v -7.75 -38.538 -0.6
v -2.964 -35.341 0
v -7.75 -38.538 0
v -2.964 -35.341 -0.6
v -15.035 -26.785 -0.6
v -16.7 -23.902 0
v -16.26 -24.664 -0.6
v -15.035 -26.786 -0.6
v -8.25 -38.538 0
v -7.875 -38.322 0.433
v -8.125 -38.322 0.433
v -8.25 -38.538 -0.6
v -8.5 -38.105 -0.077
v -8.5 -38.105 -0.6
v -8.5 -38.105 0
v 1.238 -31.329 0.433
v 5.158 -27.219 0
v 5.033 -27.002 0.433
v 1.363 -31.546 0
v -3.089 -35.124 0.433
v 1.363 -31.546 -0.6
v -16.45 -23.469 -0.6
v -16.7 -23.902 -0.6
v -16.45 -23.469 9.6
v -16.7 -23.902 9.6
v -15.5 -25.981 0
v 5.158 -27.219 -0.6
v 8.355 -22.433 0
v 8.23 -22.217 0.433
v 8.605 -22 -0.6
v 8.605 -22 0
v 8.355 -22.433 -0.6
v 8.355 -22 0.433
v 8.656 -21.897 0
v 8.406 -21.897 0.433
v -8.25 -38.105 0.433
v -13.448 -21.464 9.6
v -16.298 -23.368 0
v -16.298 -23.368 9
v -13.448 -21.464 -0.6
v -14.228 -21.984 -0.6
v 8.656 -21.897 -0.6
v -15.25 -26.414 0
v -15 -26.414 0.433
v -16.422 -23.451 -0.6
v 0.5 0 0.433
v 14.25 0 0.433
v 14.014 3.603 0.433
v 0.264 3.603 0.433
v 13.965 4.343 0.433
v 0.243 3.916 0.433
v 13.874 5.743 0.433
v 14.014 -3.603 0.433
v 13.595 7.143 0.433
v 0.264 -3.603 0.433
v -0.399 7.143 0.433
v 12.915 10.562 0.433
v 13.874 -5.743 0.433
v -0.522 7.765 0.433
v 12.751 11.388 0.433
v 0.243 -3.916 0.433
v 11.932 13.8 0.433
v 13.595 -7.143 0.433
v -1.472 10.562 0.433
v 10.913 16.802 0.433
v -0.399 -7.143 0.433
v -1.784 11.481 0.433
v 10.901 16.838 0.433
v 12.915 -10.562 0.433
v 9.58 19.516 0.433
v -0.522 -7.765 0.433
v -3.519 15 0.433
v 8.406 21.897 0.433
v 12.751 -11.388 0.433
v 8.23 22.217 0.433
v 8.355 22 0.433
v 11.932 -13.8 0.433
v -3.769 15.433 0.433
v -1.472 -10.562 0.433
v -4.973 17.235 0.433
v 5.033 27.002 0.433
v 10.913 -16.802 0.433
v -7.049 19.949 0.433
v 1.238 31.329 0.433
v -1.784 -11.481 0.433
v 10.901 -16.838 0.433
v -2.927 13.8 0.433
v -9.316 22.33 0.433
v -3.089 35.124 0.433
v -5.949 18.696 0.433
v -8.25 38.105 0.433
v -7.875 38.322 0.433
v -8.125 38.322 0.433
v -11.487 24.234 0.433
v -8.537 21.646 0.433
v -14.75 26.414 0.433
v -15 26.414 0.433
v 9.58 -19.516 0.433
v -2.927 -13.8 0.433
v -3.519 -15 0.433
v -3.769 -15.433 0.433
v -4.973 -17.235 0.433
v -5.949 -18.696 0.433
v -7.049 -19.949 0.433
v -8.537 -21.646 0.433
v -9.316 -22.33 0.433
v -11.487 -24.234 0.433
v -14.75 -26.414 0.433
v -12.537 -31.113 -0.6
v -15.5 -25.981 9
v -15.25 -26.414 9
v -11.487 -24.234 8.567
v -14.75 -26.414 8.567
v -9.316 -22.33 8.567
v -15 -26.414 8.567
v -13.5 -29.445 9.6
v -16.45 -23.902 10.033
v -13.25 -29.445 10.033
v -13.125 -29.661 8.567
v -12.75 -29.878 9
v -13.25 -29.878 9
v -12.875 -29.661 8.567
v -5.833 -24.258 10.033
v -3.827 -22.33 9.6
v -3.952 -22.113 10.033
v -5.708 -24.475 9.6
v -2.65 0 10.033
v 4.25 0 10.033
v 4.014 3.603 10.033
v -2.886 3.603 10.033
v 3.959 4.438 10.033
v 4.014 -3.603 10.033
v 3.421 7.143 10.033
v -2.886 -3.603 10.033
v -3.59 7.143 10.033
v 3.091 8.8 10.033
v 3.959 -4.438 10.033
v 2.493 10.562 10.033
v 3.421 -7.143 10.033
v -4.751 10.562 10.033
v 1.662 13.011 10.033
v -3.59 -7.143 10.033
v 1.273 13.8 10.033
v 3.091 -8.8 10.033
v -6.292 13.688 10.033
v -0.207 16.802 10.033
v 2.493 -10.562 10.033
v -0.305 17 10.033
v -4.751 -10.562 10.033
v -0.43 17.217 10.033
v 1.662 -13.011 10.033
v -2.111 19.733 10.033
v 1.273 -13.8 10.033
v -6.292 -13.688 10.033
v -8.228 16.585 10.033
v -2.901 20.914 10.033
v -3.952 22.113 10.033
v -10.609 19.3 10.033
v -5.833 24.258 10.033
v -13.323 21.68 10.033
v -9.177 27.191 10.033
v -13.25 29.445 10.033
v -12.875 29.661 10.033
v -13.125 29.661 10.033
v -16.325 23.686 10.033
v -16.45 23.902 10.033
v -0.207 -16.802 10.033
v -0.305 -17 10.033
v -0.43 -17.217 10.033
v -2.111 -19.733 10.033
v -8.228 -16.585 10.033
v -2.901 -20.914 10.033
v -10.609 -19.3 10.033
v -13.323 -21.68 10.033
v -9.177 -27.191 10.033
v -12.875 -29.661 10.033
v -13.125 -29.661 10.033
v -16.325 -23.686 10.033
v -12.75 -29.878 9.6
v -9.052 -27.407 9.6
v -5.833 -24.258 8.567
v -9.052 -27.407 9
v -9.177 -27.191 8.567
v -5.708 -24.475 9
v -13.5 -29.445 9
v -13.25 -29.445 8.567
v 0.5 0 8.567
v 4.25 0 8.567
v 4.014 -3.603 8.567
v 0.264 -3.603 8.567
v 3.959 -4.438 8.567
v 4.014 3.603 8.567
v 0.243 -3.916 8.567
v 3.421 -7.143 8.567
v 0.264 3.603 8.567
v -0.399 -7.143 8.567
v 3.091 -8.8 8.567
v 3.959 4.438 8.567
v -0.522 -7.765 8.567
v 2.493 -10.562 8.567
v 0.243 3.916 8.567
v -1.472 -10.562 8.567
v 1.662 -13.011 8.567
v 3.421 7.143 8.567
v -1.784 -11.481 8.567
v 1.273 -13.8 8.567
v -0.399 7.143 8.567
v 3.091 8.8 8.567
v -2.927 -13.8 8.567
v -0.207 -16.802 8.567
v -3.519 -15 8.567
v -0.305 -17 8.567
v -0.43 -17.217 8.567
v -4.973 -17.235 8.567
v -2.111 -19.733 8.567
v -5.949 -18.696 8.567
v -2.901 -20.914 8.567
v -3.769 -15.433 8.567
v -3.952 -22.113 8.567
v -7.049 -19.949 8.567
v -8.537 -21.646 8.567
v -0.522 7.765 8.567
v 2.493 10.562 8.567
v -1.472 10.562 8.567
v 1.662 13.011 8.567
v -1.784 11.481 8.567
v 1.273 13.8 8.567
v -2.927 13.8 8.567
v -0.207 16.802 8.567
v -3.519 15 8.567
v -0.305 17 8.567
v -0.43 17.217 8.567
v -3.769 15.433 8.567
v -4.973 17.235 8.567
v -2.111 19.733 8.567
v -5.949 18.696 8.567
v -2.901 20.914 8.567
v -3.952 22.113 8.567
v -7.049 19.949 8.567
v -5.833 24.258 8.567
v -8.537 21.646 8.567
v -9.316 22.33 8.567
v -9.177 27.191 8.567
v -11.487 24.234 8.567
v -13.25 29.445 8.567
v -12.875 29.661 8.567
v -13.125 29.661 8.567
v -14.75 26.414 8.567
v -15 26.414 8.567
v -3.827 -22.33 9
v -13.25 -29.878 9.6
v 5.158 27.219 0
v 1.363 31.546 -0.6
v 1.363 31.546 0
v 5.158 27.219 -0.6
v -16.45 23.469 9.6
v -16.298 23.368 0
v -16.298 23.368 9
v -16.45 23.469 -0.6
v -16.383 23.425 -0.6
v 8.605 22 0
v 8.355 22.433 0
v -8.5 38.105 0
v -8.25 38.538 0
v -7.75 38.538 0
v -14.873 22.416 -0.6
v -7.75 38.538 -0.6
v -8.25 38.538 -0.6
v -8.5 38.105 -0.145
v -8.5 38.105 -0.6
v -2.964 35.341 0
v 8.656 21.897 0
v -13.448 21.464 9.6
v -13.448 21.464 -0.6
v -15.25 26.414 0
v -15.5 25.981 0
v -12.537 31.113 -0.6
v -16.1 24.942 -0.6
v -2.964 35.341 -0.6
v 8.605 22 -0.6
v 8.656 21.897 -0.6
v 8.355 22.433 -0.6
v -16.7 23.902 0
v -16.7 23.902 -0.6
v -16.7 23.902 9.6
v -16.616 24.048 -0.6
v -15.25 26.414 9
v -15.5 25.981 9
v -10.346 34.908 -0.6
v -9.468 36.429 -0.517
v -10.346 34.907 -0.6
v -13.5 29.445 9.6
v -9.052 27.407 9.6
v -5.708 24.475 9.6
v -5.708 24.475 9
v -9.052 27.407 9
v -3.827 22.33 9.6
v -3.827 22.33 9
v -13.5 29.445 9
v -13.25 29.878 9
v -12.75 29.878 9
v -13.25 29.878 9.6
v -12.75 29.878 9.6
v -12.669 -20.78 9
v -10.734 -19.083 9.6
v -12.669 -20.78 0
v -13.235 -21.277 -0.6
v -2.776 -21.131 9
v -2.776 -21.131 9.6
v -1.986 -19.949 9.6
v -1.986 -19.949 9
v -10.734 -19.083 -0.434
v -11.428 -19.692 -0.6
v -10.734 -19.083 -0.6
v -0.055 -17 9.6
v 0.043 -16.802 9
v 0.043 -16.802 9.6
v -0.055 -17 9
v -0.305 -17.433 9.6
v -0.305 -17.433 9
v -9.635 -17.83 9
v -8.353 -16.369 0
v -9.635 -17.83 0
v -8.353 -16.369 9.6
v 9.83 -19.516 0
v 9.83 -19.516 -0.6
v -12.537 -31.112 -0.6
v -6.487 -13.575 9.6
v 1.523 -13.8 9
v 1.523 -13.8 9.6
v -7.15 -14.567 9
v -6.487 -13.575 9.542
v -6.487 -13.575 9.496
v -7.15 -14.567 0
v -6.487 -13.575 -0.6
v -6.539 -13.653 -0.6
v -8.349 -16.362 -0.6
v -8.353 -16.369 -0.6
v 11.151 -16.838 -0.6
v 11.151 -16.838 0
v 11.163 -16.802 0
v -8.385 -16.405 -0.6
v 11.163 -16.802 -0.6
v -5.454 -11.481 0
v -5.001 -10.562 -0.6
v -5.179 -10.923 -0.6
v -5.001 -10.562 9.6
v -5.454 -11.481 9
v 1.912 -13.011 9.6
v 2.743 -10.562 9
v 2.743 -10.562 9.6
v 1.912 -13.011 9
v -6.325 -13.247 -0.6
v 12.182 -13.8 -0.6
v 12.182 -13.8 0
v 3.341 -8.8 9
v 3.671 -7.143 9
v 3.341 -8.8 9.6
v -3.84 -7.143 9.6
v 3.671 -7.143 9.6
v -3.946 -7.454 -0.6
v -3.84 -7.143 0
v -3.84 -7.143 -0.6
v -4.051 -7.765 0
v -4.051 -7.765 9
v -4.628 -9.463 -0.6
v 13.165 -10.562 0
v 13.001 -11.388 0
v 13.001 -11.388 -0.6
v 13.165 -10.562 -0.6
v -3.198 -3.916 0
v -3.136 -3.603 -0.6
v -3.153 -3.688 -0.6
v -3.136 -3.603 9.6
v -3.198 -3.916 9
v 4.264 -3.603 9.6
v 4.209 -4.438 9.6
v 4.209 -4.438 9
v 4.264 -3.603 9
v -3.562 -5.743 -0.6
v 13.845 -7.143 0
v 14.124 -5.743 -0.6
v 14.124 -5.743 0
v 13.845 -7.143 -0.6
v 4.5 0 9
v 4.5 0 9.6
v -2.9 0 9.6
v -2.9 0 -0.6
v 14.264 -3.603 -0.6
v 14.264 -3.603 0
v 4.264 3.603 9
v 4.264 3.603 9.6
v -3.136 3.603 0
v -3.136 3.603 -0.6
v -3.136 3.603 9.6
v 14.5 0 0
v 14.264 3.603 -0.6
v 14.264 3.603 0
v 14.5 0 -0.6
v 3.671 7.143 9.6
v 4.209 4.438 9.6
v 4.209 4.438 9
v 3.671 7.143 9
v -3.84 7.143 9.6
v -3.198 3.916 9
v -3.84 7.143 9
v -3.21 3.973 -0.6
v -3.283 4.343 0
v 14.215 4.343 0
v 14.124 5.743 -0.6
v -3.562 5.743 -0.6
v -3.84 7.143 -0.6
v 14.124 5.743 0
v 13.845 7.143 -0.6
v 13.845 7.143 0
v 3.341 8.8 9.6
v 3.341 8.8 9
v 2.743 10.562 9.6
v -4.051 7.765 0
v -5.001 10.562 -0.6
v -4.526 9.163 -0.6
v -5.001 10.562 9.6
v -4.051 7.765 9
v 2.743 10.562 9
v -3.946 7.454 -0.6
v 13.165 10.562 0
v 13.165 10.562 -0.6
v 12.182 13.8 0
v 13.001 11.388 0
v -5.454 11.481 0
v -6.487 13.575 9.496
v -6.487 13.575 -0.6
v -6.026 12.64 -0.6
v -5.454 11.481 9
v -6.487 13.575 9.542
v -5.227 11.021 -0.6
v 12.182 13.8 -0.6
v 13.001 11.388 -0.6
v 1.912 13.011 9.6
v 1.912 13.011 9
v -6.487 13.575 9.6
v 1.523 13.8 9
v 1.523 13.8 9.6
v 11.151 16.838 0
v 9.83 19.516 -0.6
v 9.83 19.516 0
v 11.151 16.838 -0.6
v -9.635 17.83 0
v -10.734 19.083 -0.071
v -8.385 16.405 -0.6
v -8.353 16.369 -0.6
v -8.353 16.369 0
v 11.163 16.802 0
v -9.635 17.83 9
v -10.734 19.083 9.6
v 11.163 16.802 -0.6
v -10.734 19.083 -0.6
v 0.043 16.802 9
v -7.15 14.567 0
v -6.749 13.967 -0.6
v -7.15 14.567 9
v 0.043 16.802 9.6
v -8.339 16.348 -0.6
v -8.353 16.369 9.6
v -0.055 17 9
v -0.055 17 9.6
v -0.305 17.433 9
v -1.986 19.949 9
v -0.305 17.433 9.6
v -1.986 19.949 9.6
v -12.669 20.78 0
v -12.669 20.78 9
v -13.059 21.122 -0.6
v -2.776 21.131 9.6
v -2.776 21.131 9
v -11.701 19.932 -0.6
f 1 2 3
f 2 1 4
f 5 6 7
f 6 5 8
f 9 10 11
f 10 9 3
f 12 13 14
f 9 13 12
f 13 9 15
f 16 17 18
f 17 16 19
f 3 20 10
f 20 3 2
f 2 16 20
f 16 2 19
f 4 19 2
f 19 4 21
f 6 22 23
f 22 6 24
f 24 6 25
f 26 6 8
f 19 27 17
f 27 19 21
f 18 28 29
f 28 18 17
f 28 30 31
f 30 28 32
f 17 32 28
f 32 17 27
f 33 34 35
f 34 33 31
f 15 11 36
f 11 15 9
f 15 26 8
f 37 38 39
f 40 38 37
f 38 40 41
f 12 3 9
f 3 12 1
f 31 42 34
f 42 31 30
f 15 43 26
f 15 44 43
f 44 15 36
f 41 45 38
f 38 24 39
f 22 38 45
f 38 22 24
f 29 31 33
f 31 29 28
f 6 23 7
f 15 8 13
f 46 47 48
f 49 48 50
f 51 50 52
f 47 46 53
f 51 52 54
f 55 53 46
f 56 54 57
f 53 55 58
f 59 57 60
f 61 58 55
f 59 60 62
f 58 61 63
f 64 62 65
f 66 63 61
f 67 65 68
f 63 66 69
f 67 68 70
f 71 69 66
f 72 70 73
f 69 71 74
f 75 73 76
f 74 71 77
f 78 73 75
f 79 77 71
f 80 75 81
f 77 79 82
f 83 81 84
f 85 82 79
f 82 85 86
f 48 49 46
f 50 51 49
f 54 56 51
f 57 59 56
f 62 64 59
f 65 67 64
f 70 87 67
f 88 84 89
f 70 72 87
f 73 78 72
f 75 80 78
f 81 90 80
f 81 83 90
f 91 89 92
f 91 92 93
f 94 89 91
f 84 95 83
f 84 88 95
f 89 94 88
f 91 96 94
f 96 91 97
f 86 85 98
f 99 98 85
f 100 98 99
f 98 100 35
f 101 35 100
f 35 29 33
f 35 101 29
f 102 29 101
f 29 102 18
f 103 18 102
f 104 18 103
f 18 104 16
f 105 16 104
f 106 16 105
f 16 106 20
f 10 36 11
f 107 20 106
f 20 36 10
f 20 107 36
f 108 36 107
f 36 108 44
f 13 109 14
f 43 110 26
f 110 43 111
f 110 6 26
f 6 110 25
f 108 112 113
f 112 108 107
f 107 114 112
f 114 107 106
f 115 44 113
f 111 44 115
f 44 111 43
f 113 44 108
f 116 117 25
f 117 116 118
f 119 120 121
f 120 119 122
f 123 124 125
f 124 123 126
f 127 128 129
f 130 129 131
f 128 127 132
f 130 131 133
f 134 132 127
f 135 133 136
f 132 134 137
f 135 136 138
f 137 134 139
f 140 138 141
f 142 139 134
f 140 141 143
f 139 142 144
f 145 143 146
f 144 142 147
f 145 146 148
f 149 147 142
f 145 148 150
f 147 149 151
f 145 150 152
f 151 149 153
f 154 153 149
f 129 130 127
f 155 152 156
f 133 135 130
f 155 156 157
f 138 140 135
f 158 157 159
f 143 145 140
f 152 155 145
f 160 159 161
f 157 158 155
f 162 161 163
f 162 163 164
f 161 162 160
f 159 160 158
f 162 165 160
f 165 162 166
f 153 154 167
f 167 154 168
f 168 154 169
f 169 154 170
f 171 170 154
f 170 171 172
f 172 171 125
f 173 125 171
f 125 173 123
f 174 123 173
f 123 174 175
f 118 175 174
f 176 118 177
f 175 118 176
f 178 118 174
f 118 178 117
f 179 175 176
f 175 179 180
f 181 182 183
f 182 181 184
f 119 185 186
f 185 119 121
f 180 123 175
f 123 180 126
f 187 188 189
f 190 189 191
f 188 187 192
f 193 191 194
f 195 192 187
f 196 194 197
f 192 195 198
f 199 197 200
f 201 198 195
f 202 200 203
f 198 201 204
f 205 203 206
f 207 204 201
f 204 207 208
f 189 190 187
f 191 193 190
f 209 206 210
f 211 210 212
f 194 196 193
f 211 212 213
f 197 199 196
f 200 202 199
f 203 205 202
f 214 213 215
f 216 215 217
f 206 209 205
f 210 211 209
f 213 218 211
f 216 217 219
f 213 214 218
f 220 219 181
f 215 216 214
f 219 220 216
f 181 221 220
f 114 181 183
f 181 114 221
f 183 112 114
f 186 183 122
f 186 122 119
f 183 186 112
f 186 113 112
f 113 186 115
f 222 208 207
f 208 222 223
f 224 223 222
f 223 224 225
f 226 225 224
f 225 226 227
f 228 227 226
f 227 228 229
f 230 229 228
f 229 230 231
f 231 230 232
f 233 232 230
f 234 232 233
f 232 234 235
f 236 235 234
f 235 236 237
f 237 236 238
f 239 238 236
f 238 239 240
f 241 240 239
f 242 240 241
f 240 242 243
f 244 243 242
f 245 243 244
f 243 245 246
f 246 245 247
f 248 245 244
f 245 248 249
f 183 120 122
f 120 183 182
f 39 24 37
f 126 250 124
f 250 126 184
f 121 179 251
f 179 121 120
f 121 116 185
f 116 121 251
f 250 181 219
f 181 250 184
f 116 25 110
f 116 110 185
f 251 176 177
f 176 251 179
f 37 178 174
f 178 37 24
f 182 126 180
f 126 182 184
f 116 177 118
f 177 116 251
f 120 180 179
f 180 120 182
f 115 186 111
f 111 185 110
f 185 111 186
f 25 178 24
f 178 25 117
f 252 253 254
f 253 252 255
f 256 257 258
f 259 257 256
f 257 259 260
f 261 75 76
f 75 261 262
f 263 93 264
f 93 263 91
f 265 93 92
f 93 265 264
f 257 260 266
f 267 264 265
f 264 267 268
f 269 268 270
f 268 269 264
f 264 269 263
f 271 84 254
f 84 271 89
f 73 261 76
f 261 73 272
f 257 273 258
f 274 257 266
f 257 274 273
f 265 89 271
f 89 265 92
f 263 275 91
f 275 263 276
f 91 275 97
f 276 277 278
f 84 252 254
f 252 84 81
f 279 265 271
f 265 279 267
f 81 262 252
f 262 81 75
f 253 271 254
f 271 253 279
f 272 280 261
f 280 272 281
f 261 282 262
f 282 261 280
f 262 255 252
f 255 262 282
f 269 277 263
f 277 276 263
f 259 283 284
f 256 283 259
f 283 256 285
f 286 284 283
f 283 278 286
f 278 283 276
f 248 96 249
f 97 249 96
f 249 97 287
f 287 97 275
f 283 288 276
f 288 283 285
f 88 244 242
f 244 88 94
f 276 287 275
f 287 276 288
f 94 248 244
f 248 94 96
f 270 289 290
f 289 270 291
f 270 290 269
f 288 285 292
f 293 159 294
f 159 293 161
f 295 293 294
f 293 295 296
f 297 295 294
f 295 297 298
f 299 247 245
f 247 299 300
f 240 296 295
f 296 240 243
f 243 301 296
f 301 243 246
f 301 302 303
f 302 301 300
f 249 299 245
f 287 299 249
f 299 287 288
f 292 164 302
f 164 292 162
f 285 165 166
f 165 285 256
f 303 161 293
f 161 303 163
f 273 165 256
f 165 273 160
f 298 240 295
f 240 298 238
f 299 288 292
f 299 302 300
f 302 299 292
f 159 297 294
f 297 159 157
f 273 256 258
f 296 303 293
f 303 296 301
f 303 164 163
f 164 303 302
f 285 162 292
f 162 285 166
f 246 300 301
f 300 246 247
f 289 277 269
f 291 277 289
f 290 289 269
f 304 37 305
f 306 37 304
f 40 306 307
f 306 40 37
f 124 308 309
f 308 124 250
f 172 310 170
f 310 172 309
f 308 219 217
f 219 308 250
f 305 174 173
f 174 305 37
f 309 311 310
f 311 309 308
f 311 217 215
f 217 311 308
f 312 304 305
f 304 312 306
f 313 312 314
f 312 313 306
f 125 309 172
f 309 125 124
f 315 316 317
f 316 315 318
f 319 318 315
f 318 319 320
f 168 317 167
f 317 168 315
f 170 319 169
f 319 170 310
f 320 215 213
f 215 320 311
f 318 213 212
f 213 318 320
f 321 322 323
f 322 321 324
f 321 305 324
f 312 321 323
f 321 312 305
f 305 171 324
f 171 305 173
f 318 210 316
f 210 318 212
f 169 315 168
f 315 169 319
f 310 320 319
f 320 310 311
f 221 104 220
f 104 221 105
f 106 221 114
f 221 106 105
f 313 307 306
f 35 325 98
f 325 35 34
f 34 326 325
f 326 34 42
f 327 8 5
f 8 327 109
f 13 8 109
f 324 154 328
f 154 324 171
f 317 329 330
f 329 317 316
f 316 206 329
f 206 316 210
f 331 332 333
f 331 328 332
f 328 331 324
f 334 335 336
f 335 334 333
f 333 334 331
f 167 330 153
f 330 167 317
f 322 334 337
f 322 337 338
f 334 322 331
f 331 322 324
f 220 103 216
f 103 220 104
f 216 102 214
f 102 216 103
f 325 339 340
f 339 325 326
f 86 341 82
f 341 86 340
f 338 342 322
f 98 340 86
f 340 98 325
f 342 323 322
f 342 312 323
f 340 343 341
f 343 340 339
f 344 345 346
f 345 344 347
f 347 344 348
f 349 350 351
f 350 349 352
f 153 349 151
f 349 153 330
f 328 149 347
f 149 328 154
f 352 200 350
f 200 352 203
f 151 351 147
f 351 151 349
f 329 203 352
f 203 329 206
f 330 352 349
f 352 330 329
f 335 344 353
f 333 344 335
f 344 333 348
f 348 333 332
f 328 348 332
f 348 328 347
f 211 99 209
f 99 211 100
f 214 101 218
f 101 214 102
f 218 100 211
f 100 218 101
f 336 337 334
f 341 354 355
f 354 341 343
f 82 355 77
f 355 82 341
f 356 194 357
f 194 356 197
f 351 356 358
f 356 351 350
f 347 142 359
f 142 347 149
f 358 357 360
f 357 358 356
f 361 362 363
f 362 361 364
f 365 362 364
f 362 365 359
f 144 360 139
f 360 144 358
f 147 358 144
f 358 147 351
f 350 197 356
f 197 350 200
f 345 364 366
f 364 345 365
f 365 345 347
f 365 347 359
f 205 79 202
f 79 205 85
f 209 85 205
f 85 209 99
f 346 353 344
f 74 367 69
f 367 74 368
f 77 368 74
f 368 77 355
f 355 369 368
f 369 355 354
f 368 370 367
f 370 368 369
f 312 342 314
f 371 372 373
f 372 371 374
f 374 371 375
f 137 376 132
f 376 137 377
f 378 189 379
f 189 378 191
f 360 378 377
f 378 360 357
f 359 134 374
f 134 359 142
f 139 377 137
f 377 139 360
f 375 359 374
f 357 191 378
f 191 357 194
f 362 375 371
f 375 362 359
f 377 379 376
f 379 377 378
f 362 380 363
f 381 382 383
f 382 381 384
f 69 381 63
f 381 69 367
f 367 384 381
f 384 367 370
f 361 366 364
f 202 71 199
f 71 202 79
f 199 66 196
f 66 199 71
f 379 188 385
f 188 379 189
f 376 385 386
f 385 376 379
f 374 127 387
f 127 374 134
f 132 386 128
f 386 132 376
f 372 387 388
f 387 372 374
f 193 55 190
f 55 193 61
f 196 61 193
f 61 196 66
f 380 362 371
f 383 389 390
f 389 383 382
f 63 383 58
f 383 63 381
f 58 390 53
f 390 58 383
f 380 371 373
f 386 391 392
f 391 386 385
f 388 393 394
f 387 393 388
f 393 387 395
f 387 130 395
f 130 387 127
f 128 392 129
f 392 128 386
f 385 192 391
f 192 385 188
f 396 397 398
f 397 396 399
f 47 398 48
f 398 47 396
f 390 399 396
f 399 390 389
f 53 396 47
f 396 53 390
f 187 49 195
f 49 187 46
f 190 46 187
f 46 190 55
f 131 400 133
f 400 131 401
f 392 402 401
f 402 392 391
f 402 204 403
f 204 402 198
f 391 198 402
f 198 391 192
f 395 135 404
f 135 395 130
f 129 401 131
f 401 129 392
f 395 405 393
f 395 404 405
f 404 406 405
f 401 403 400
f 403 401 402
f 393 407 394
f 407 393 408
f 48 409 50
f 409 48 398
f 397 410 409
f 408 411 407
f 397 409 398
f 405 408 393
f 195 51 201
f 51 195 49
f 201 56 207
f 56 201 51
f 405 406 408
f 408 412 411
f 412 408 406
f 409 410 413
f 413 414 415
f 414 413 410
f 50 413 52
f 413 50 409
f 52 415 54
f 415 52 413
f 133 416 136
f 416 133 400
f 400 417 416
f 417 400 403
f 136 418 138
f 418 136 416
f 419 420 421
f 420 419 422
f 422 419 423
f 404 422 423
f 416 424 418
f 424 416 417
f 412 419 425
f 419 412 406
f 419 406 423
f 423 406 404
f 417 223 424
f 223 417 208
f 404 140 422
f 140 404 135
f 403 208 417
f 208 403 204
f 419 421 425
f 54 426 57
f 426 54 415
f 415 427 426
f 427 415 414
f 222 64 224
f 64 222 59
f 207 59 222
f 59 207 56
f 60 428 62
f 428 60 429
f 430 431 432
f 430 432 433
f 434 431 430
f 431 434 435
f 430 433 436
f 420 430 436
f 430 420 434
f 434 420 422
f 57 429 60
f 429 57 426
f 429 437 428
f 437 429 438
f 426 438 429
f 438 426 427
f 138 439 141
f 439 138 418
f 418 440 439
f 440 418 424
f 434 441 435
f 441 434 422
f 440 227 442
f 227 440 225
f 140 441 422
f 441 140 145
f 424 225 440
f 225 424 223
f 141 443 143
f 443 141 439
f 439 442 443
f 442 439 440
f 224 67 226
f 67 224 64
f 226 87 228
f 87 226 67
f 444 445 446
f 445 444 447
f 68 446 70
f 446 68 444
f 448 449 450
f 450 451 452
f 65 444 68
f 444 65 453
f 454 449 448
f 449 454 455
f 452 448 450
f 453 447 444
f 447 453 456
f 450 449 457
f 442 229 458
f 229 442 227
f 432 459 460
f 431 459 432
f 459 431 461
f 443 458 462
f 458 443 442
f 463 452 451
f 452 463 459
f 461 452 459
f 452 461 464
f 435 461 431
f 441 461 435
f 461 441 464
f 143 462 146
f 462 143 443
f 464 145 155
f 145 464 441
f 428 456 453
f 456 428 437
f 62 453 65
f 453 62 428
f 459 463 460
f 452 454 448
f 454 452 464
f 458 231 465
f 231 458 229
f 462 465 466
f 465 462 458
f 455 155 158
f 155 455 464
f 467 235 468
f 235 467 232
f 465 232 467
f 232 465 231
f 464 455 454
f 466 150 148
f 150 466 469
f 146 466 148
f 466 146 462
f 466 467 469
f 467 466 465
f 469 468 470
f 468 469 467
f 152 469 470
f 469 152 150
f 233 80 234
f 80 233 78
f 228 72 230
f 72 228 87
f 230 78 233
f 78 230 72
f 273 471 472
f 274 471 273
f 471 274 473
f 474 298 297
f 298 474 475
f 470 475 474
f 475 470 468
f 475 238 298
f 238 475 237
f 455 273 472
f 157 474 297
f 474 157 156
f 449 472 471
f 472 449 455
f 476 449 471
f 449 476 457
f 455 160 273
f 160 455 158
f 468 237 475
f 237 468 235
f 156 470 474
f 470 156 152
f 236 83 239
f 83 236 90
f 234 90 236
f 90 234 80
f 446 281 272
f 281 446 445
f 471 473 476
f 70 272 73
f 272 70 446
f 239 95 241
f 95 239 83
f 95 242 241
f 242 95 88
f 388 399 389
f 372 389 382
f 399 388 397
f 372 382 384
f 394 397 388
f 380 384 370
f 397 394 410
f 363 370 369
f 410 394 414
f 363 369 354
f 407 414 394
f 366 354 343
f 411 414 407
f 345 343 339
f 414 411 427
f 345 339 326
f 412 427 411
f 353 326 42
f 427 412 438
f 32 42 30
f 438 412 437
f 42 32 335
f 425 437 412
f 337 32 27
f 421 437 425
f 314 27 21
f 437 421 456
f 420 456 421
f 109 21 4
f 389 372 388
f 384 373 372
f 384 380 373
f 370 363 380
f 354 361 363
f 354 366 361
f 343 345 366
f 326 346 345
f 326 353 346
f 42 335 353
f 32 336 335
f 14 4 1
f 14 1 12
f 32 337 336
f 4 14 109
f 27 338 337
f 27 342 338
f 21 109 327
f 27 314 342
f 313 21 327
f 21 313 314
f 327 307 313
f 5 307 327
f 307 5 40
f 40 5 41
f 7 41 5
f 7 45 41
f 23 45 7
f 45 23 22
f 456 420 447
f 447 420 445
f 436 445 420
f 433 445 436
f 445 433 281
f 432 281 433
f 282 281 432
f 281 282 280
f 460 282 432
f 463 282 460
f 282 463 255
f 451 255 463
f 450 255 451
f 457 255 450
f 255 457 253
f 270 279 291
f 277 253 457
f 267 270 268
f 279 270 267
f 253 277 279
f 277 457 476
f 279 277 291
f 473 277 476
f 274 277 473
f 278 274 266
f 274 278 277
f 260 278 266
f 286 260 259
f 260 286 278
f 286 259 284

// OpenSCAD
MD=1;
a=14;
b=4;
s=8+MD;
A=120;
W=1.6-MD;

function    circleSlice2radius(a,b) = (a/2)*(a/2)/(2*b);

mode="preview";
SS=(mode=="def") ? 16 : 6;
//r=circleSlice2radius(165,35);
r=30;
echo(r);

//translate([0,-r,0])
//cylinder($fn=

difference() { 
translate([-r,0,0])
minkowski()
{
rotate(-A/2)
rotate_extrude(angle=A,$fn=SS*8) {
    W0=-2*W;
    translate([r,0])   {
        polygon([
            [2*W0,W0],
            [a,W0/2],
            [a,0],
            [0,0],
            [0,s],
            [b,s],
            [b,s+W],
            [2*W0,s+W],
        
                ]);
    }
}
sphere($fn=SS,d=MD);
}

    translate([0,0,-100-W])
    cube(200,center=true);
}
